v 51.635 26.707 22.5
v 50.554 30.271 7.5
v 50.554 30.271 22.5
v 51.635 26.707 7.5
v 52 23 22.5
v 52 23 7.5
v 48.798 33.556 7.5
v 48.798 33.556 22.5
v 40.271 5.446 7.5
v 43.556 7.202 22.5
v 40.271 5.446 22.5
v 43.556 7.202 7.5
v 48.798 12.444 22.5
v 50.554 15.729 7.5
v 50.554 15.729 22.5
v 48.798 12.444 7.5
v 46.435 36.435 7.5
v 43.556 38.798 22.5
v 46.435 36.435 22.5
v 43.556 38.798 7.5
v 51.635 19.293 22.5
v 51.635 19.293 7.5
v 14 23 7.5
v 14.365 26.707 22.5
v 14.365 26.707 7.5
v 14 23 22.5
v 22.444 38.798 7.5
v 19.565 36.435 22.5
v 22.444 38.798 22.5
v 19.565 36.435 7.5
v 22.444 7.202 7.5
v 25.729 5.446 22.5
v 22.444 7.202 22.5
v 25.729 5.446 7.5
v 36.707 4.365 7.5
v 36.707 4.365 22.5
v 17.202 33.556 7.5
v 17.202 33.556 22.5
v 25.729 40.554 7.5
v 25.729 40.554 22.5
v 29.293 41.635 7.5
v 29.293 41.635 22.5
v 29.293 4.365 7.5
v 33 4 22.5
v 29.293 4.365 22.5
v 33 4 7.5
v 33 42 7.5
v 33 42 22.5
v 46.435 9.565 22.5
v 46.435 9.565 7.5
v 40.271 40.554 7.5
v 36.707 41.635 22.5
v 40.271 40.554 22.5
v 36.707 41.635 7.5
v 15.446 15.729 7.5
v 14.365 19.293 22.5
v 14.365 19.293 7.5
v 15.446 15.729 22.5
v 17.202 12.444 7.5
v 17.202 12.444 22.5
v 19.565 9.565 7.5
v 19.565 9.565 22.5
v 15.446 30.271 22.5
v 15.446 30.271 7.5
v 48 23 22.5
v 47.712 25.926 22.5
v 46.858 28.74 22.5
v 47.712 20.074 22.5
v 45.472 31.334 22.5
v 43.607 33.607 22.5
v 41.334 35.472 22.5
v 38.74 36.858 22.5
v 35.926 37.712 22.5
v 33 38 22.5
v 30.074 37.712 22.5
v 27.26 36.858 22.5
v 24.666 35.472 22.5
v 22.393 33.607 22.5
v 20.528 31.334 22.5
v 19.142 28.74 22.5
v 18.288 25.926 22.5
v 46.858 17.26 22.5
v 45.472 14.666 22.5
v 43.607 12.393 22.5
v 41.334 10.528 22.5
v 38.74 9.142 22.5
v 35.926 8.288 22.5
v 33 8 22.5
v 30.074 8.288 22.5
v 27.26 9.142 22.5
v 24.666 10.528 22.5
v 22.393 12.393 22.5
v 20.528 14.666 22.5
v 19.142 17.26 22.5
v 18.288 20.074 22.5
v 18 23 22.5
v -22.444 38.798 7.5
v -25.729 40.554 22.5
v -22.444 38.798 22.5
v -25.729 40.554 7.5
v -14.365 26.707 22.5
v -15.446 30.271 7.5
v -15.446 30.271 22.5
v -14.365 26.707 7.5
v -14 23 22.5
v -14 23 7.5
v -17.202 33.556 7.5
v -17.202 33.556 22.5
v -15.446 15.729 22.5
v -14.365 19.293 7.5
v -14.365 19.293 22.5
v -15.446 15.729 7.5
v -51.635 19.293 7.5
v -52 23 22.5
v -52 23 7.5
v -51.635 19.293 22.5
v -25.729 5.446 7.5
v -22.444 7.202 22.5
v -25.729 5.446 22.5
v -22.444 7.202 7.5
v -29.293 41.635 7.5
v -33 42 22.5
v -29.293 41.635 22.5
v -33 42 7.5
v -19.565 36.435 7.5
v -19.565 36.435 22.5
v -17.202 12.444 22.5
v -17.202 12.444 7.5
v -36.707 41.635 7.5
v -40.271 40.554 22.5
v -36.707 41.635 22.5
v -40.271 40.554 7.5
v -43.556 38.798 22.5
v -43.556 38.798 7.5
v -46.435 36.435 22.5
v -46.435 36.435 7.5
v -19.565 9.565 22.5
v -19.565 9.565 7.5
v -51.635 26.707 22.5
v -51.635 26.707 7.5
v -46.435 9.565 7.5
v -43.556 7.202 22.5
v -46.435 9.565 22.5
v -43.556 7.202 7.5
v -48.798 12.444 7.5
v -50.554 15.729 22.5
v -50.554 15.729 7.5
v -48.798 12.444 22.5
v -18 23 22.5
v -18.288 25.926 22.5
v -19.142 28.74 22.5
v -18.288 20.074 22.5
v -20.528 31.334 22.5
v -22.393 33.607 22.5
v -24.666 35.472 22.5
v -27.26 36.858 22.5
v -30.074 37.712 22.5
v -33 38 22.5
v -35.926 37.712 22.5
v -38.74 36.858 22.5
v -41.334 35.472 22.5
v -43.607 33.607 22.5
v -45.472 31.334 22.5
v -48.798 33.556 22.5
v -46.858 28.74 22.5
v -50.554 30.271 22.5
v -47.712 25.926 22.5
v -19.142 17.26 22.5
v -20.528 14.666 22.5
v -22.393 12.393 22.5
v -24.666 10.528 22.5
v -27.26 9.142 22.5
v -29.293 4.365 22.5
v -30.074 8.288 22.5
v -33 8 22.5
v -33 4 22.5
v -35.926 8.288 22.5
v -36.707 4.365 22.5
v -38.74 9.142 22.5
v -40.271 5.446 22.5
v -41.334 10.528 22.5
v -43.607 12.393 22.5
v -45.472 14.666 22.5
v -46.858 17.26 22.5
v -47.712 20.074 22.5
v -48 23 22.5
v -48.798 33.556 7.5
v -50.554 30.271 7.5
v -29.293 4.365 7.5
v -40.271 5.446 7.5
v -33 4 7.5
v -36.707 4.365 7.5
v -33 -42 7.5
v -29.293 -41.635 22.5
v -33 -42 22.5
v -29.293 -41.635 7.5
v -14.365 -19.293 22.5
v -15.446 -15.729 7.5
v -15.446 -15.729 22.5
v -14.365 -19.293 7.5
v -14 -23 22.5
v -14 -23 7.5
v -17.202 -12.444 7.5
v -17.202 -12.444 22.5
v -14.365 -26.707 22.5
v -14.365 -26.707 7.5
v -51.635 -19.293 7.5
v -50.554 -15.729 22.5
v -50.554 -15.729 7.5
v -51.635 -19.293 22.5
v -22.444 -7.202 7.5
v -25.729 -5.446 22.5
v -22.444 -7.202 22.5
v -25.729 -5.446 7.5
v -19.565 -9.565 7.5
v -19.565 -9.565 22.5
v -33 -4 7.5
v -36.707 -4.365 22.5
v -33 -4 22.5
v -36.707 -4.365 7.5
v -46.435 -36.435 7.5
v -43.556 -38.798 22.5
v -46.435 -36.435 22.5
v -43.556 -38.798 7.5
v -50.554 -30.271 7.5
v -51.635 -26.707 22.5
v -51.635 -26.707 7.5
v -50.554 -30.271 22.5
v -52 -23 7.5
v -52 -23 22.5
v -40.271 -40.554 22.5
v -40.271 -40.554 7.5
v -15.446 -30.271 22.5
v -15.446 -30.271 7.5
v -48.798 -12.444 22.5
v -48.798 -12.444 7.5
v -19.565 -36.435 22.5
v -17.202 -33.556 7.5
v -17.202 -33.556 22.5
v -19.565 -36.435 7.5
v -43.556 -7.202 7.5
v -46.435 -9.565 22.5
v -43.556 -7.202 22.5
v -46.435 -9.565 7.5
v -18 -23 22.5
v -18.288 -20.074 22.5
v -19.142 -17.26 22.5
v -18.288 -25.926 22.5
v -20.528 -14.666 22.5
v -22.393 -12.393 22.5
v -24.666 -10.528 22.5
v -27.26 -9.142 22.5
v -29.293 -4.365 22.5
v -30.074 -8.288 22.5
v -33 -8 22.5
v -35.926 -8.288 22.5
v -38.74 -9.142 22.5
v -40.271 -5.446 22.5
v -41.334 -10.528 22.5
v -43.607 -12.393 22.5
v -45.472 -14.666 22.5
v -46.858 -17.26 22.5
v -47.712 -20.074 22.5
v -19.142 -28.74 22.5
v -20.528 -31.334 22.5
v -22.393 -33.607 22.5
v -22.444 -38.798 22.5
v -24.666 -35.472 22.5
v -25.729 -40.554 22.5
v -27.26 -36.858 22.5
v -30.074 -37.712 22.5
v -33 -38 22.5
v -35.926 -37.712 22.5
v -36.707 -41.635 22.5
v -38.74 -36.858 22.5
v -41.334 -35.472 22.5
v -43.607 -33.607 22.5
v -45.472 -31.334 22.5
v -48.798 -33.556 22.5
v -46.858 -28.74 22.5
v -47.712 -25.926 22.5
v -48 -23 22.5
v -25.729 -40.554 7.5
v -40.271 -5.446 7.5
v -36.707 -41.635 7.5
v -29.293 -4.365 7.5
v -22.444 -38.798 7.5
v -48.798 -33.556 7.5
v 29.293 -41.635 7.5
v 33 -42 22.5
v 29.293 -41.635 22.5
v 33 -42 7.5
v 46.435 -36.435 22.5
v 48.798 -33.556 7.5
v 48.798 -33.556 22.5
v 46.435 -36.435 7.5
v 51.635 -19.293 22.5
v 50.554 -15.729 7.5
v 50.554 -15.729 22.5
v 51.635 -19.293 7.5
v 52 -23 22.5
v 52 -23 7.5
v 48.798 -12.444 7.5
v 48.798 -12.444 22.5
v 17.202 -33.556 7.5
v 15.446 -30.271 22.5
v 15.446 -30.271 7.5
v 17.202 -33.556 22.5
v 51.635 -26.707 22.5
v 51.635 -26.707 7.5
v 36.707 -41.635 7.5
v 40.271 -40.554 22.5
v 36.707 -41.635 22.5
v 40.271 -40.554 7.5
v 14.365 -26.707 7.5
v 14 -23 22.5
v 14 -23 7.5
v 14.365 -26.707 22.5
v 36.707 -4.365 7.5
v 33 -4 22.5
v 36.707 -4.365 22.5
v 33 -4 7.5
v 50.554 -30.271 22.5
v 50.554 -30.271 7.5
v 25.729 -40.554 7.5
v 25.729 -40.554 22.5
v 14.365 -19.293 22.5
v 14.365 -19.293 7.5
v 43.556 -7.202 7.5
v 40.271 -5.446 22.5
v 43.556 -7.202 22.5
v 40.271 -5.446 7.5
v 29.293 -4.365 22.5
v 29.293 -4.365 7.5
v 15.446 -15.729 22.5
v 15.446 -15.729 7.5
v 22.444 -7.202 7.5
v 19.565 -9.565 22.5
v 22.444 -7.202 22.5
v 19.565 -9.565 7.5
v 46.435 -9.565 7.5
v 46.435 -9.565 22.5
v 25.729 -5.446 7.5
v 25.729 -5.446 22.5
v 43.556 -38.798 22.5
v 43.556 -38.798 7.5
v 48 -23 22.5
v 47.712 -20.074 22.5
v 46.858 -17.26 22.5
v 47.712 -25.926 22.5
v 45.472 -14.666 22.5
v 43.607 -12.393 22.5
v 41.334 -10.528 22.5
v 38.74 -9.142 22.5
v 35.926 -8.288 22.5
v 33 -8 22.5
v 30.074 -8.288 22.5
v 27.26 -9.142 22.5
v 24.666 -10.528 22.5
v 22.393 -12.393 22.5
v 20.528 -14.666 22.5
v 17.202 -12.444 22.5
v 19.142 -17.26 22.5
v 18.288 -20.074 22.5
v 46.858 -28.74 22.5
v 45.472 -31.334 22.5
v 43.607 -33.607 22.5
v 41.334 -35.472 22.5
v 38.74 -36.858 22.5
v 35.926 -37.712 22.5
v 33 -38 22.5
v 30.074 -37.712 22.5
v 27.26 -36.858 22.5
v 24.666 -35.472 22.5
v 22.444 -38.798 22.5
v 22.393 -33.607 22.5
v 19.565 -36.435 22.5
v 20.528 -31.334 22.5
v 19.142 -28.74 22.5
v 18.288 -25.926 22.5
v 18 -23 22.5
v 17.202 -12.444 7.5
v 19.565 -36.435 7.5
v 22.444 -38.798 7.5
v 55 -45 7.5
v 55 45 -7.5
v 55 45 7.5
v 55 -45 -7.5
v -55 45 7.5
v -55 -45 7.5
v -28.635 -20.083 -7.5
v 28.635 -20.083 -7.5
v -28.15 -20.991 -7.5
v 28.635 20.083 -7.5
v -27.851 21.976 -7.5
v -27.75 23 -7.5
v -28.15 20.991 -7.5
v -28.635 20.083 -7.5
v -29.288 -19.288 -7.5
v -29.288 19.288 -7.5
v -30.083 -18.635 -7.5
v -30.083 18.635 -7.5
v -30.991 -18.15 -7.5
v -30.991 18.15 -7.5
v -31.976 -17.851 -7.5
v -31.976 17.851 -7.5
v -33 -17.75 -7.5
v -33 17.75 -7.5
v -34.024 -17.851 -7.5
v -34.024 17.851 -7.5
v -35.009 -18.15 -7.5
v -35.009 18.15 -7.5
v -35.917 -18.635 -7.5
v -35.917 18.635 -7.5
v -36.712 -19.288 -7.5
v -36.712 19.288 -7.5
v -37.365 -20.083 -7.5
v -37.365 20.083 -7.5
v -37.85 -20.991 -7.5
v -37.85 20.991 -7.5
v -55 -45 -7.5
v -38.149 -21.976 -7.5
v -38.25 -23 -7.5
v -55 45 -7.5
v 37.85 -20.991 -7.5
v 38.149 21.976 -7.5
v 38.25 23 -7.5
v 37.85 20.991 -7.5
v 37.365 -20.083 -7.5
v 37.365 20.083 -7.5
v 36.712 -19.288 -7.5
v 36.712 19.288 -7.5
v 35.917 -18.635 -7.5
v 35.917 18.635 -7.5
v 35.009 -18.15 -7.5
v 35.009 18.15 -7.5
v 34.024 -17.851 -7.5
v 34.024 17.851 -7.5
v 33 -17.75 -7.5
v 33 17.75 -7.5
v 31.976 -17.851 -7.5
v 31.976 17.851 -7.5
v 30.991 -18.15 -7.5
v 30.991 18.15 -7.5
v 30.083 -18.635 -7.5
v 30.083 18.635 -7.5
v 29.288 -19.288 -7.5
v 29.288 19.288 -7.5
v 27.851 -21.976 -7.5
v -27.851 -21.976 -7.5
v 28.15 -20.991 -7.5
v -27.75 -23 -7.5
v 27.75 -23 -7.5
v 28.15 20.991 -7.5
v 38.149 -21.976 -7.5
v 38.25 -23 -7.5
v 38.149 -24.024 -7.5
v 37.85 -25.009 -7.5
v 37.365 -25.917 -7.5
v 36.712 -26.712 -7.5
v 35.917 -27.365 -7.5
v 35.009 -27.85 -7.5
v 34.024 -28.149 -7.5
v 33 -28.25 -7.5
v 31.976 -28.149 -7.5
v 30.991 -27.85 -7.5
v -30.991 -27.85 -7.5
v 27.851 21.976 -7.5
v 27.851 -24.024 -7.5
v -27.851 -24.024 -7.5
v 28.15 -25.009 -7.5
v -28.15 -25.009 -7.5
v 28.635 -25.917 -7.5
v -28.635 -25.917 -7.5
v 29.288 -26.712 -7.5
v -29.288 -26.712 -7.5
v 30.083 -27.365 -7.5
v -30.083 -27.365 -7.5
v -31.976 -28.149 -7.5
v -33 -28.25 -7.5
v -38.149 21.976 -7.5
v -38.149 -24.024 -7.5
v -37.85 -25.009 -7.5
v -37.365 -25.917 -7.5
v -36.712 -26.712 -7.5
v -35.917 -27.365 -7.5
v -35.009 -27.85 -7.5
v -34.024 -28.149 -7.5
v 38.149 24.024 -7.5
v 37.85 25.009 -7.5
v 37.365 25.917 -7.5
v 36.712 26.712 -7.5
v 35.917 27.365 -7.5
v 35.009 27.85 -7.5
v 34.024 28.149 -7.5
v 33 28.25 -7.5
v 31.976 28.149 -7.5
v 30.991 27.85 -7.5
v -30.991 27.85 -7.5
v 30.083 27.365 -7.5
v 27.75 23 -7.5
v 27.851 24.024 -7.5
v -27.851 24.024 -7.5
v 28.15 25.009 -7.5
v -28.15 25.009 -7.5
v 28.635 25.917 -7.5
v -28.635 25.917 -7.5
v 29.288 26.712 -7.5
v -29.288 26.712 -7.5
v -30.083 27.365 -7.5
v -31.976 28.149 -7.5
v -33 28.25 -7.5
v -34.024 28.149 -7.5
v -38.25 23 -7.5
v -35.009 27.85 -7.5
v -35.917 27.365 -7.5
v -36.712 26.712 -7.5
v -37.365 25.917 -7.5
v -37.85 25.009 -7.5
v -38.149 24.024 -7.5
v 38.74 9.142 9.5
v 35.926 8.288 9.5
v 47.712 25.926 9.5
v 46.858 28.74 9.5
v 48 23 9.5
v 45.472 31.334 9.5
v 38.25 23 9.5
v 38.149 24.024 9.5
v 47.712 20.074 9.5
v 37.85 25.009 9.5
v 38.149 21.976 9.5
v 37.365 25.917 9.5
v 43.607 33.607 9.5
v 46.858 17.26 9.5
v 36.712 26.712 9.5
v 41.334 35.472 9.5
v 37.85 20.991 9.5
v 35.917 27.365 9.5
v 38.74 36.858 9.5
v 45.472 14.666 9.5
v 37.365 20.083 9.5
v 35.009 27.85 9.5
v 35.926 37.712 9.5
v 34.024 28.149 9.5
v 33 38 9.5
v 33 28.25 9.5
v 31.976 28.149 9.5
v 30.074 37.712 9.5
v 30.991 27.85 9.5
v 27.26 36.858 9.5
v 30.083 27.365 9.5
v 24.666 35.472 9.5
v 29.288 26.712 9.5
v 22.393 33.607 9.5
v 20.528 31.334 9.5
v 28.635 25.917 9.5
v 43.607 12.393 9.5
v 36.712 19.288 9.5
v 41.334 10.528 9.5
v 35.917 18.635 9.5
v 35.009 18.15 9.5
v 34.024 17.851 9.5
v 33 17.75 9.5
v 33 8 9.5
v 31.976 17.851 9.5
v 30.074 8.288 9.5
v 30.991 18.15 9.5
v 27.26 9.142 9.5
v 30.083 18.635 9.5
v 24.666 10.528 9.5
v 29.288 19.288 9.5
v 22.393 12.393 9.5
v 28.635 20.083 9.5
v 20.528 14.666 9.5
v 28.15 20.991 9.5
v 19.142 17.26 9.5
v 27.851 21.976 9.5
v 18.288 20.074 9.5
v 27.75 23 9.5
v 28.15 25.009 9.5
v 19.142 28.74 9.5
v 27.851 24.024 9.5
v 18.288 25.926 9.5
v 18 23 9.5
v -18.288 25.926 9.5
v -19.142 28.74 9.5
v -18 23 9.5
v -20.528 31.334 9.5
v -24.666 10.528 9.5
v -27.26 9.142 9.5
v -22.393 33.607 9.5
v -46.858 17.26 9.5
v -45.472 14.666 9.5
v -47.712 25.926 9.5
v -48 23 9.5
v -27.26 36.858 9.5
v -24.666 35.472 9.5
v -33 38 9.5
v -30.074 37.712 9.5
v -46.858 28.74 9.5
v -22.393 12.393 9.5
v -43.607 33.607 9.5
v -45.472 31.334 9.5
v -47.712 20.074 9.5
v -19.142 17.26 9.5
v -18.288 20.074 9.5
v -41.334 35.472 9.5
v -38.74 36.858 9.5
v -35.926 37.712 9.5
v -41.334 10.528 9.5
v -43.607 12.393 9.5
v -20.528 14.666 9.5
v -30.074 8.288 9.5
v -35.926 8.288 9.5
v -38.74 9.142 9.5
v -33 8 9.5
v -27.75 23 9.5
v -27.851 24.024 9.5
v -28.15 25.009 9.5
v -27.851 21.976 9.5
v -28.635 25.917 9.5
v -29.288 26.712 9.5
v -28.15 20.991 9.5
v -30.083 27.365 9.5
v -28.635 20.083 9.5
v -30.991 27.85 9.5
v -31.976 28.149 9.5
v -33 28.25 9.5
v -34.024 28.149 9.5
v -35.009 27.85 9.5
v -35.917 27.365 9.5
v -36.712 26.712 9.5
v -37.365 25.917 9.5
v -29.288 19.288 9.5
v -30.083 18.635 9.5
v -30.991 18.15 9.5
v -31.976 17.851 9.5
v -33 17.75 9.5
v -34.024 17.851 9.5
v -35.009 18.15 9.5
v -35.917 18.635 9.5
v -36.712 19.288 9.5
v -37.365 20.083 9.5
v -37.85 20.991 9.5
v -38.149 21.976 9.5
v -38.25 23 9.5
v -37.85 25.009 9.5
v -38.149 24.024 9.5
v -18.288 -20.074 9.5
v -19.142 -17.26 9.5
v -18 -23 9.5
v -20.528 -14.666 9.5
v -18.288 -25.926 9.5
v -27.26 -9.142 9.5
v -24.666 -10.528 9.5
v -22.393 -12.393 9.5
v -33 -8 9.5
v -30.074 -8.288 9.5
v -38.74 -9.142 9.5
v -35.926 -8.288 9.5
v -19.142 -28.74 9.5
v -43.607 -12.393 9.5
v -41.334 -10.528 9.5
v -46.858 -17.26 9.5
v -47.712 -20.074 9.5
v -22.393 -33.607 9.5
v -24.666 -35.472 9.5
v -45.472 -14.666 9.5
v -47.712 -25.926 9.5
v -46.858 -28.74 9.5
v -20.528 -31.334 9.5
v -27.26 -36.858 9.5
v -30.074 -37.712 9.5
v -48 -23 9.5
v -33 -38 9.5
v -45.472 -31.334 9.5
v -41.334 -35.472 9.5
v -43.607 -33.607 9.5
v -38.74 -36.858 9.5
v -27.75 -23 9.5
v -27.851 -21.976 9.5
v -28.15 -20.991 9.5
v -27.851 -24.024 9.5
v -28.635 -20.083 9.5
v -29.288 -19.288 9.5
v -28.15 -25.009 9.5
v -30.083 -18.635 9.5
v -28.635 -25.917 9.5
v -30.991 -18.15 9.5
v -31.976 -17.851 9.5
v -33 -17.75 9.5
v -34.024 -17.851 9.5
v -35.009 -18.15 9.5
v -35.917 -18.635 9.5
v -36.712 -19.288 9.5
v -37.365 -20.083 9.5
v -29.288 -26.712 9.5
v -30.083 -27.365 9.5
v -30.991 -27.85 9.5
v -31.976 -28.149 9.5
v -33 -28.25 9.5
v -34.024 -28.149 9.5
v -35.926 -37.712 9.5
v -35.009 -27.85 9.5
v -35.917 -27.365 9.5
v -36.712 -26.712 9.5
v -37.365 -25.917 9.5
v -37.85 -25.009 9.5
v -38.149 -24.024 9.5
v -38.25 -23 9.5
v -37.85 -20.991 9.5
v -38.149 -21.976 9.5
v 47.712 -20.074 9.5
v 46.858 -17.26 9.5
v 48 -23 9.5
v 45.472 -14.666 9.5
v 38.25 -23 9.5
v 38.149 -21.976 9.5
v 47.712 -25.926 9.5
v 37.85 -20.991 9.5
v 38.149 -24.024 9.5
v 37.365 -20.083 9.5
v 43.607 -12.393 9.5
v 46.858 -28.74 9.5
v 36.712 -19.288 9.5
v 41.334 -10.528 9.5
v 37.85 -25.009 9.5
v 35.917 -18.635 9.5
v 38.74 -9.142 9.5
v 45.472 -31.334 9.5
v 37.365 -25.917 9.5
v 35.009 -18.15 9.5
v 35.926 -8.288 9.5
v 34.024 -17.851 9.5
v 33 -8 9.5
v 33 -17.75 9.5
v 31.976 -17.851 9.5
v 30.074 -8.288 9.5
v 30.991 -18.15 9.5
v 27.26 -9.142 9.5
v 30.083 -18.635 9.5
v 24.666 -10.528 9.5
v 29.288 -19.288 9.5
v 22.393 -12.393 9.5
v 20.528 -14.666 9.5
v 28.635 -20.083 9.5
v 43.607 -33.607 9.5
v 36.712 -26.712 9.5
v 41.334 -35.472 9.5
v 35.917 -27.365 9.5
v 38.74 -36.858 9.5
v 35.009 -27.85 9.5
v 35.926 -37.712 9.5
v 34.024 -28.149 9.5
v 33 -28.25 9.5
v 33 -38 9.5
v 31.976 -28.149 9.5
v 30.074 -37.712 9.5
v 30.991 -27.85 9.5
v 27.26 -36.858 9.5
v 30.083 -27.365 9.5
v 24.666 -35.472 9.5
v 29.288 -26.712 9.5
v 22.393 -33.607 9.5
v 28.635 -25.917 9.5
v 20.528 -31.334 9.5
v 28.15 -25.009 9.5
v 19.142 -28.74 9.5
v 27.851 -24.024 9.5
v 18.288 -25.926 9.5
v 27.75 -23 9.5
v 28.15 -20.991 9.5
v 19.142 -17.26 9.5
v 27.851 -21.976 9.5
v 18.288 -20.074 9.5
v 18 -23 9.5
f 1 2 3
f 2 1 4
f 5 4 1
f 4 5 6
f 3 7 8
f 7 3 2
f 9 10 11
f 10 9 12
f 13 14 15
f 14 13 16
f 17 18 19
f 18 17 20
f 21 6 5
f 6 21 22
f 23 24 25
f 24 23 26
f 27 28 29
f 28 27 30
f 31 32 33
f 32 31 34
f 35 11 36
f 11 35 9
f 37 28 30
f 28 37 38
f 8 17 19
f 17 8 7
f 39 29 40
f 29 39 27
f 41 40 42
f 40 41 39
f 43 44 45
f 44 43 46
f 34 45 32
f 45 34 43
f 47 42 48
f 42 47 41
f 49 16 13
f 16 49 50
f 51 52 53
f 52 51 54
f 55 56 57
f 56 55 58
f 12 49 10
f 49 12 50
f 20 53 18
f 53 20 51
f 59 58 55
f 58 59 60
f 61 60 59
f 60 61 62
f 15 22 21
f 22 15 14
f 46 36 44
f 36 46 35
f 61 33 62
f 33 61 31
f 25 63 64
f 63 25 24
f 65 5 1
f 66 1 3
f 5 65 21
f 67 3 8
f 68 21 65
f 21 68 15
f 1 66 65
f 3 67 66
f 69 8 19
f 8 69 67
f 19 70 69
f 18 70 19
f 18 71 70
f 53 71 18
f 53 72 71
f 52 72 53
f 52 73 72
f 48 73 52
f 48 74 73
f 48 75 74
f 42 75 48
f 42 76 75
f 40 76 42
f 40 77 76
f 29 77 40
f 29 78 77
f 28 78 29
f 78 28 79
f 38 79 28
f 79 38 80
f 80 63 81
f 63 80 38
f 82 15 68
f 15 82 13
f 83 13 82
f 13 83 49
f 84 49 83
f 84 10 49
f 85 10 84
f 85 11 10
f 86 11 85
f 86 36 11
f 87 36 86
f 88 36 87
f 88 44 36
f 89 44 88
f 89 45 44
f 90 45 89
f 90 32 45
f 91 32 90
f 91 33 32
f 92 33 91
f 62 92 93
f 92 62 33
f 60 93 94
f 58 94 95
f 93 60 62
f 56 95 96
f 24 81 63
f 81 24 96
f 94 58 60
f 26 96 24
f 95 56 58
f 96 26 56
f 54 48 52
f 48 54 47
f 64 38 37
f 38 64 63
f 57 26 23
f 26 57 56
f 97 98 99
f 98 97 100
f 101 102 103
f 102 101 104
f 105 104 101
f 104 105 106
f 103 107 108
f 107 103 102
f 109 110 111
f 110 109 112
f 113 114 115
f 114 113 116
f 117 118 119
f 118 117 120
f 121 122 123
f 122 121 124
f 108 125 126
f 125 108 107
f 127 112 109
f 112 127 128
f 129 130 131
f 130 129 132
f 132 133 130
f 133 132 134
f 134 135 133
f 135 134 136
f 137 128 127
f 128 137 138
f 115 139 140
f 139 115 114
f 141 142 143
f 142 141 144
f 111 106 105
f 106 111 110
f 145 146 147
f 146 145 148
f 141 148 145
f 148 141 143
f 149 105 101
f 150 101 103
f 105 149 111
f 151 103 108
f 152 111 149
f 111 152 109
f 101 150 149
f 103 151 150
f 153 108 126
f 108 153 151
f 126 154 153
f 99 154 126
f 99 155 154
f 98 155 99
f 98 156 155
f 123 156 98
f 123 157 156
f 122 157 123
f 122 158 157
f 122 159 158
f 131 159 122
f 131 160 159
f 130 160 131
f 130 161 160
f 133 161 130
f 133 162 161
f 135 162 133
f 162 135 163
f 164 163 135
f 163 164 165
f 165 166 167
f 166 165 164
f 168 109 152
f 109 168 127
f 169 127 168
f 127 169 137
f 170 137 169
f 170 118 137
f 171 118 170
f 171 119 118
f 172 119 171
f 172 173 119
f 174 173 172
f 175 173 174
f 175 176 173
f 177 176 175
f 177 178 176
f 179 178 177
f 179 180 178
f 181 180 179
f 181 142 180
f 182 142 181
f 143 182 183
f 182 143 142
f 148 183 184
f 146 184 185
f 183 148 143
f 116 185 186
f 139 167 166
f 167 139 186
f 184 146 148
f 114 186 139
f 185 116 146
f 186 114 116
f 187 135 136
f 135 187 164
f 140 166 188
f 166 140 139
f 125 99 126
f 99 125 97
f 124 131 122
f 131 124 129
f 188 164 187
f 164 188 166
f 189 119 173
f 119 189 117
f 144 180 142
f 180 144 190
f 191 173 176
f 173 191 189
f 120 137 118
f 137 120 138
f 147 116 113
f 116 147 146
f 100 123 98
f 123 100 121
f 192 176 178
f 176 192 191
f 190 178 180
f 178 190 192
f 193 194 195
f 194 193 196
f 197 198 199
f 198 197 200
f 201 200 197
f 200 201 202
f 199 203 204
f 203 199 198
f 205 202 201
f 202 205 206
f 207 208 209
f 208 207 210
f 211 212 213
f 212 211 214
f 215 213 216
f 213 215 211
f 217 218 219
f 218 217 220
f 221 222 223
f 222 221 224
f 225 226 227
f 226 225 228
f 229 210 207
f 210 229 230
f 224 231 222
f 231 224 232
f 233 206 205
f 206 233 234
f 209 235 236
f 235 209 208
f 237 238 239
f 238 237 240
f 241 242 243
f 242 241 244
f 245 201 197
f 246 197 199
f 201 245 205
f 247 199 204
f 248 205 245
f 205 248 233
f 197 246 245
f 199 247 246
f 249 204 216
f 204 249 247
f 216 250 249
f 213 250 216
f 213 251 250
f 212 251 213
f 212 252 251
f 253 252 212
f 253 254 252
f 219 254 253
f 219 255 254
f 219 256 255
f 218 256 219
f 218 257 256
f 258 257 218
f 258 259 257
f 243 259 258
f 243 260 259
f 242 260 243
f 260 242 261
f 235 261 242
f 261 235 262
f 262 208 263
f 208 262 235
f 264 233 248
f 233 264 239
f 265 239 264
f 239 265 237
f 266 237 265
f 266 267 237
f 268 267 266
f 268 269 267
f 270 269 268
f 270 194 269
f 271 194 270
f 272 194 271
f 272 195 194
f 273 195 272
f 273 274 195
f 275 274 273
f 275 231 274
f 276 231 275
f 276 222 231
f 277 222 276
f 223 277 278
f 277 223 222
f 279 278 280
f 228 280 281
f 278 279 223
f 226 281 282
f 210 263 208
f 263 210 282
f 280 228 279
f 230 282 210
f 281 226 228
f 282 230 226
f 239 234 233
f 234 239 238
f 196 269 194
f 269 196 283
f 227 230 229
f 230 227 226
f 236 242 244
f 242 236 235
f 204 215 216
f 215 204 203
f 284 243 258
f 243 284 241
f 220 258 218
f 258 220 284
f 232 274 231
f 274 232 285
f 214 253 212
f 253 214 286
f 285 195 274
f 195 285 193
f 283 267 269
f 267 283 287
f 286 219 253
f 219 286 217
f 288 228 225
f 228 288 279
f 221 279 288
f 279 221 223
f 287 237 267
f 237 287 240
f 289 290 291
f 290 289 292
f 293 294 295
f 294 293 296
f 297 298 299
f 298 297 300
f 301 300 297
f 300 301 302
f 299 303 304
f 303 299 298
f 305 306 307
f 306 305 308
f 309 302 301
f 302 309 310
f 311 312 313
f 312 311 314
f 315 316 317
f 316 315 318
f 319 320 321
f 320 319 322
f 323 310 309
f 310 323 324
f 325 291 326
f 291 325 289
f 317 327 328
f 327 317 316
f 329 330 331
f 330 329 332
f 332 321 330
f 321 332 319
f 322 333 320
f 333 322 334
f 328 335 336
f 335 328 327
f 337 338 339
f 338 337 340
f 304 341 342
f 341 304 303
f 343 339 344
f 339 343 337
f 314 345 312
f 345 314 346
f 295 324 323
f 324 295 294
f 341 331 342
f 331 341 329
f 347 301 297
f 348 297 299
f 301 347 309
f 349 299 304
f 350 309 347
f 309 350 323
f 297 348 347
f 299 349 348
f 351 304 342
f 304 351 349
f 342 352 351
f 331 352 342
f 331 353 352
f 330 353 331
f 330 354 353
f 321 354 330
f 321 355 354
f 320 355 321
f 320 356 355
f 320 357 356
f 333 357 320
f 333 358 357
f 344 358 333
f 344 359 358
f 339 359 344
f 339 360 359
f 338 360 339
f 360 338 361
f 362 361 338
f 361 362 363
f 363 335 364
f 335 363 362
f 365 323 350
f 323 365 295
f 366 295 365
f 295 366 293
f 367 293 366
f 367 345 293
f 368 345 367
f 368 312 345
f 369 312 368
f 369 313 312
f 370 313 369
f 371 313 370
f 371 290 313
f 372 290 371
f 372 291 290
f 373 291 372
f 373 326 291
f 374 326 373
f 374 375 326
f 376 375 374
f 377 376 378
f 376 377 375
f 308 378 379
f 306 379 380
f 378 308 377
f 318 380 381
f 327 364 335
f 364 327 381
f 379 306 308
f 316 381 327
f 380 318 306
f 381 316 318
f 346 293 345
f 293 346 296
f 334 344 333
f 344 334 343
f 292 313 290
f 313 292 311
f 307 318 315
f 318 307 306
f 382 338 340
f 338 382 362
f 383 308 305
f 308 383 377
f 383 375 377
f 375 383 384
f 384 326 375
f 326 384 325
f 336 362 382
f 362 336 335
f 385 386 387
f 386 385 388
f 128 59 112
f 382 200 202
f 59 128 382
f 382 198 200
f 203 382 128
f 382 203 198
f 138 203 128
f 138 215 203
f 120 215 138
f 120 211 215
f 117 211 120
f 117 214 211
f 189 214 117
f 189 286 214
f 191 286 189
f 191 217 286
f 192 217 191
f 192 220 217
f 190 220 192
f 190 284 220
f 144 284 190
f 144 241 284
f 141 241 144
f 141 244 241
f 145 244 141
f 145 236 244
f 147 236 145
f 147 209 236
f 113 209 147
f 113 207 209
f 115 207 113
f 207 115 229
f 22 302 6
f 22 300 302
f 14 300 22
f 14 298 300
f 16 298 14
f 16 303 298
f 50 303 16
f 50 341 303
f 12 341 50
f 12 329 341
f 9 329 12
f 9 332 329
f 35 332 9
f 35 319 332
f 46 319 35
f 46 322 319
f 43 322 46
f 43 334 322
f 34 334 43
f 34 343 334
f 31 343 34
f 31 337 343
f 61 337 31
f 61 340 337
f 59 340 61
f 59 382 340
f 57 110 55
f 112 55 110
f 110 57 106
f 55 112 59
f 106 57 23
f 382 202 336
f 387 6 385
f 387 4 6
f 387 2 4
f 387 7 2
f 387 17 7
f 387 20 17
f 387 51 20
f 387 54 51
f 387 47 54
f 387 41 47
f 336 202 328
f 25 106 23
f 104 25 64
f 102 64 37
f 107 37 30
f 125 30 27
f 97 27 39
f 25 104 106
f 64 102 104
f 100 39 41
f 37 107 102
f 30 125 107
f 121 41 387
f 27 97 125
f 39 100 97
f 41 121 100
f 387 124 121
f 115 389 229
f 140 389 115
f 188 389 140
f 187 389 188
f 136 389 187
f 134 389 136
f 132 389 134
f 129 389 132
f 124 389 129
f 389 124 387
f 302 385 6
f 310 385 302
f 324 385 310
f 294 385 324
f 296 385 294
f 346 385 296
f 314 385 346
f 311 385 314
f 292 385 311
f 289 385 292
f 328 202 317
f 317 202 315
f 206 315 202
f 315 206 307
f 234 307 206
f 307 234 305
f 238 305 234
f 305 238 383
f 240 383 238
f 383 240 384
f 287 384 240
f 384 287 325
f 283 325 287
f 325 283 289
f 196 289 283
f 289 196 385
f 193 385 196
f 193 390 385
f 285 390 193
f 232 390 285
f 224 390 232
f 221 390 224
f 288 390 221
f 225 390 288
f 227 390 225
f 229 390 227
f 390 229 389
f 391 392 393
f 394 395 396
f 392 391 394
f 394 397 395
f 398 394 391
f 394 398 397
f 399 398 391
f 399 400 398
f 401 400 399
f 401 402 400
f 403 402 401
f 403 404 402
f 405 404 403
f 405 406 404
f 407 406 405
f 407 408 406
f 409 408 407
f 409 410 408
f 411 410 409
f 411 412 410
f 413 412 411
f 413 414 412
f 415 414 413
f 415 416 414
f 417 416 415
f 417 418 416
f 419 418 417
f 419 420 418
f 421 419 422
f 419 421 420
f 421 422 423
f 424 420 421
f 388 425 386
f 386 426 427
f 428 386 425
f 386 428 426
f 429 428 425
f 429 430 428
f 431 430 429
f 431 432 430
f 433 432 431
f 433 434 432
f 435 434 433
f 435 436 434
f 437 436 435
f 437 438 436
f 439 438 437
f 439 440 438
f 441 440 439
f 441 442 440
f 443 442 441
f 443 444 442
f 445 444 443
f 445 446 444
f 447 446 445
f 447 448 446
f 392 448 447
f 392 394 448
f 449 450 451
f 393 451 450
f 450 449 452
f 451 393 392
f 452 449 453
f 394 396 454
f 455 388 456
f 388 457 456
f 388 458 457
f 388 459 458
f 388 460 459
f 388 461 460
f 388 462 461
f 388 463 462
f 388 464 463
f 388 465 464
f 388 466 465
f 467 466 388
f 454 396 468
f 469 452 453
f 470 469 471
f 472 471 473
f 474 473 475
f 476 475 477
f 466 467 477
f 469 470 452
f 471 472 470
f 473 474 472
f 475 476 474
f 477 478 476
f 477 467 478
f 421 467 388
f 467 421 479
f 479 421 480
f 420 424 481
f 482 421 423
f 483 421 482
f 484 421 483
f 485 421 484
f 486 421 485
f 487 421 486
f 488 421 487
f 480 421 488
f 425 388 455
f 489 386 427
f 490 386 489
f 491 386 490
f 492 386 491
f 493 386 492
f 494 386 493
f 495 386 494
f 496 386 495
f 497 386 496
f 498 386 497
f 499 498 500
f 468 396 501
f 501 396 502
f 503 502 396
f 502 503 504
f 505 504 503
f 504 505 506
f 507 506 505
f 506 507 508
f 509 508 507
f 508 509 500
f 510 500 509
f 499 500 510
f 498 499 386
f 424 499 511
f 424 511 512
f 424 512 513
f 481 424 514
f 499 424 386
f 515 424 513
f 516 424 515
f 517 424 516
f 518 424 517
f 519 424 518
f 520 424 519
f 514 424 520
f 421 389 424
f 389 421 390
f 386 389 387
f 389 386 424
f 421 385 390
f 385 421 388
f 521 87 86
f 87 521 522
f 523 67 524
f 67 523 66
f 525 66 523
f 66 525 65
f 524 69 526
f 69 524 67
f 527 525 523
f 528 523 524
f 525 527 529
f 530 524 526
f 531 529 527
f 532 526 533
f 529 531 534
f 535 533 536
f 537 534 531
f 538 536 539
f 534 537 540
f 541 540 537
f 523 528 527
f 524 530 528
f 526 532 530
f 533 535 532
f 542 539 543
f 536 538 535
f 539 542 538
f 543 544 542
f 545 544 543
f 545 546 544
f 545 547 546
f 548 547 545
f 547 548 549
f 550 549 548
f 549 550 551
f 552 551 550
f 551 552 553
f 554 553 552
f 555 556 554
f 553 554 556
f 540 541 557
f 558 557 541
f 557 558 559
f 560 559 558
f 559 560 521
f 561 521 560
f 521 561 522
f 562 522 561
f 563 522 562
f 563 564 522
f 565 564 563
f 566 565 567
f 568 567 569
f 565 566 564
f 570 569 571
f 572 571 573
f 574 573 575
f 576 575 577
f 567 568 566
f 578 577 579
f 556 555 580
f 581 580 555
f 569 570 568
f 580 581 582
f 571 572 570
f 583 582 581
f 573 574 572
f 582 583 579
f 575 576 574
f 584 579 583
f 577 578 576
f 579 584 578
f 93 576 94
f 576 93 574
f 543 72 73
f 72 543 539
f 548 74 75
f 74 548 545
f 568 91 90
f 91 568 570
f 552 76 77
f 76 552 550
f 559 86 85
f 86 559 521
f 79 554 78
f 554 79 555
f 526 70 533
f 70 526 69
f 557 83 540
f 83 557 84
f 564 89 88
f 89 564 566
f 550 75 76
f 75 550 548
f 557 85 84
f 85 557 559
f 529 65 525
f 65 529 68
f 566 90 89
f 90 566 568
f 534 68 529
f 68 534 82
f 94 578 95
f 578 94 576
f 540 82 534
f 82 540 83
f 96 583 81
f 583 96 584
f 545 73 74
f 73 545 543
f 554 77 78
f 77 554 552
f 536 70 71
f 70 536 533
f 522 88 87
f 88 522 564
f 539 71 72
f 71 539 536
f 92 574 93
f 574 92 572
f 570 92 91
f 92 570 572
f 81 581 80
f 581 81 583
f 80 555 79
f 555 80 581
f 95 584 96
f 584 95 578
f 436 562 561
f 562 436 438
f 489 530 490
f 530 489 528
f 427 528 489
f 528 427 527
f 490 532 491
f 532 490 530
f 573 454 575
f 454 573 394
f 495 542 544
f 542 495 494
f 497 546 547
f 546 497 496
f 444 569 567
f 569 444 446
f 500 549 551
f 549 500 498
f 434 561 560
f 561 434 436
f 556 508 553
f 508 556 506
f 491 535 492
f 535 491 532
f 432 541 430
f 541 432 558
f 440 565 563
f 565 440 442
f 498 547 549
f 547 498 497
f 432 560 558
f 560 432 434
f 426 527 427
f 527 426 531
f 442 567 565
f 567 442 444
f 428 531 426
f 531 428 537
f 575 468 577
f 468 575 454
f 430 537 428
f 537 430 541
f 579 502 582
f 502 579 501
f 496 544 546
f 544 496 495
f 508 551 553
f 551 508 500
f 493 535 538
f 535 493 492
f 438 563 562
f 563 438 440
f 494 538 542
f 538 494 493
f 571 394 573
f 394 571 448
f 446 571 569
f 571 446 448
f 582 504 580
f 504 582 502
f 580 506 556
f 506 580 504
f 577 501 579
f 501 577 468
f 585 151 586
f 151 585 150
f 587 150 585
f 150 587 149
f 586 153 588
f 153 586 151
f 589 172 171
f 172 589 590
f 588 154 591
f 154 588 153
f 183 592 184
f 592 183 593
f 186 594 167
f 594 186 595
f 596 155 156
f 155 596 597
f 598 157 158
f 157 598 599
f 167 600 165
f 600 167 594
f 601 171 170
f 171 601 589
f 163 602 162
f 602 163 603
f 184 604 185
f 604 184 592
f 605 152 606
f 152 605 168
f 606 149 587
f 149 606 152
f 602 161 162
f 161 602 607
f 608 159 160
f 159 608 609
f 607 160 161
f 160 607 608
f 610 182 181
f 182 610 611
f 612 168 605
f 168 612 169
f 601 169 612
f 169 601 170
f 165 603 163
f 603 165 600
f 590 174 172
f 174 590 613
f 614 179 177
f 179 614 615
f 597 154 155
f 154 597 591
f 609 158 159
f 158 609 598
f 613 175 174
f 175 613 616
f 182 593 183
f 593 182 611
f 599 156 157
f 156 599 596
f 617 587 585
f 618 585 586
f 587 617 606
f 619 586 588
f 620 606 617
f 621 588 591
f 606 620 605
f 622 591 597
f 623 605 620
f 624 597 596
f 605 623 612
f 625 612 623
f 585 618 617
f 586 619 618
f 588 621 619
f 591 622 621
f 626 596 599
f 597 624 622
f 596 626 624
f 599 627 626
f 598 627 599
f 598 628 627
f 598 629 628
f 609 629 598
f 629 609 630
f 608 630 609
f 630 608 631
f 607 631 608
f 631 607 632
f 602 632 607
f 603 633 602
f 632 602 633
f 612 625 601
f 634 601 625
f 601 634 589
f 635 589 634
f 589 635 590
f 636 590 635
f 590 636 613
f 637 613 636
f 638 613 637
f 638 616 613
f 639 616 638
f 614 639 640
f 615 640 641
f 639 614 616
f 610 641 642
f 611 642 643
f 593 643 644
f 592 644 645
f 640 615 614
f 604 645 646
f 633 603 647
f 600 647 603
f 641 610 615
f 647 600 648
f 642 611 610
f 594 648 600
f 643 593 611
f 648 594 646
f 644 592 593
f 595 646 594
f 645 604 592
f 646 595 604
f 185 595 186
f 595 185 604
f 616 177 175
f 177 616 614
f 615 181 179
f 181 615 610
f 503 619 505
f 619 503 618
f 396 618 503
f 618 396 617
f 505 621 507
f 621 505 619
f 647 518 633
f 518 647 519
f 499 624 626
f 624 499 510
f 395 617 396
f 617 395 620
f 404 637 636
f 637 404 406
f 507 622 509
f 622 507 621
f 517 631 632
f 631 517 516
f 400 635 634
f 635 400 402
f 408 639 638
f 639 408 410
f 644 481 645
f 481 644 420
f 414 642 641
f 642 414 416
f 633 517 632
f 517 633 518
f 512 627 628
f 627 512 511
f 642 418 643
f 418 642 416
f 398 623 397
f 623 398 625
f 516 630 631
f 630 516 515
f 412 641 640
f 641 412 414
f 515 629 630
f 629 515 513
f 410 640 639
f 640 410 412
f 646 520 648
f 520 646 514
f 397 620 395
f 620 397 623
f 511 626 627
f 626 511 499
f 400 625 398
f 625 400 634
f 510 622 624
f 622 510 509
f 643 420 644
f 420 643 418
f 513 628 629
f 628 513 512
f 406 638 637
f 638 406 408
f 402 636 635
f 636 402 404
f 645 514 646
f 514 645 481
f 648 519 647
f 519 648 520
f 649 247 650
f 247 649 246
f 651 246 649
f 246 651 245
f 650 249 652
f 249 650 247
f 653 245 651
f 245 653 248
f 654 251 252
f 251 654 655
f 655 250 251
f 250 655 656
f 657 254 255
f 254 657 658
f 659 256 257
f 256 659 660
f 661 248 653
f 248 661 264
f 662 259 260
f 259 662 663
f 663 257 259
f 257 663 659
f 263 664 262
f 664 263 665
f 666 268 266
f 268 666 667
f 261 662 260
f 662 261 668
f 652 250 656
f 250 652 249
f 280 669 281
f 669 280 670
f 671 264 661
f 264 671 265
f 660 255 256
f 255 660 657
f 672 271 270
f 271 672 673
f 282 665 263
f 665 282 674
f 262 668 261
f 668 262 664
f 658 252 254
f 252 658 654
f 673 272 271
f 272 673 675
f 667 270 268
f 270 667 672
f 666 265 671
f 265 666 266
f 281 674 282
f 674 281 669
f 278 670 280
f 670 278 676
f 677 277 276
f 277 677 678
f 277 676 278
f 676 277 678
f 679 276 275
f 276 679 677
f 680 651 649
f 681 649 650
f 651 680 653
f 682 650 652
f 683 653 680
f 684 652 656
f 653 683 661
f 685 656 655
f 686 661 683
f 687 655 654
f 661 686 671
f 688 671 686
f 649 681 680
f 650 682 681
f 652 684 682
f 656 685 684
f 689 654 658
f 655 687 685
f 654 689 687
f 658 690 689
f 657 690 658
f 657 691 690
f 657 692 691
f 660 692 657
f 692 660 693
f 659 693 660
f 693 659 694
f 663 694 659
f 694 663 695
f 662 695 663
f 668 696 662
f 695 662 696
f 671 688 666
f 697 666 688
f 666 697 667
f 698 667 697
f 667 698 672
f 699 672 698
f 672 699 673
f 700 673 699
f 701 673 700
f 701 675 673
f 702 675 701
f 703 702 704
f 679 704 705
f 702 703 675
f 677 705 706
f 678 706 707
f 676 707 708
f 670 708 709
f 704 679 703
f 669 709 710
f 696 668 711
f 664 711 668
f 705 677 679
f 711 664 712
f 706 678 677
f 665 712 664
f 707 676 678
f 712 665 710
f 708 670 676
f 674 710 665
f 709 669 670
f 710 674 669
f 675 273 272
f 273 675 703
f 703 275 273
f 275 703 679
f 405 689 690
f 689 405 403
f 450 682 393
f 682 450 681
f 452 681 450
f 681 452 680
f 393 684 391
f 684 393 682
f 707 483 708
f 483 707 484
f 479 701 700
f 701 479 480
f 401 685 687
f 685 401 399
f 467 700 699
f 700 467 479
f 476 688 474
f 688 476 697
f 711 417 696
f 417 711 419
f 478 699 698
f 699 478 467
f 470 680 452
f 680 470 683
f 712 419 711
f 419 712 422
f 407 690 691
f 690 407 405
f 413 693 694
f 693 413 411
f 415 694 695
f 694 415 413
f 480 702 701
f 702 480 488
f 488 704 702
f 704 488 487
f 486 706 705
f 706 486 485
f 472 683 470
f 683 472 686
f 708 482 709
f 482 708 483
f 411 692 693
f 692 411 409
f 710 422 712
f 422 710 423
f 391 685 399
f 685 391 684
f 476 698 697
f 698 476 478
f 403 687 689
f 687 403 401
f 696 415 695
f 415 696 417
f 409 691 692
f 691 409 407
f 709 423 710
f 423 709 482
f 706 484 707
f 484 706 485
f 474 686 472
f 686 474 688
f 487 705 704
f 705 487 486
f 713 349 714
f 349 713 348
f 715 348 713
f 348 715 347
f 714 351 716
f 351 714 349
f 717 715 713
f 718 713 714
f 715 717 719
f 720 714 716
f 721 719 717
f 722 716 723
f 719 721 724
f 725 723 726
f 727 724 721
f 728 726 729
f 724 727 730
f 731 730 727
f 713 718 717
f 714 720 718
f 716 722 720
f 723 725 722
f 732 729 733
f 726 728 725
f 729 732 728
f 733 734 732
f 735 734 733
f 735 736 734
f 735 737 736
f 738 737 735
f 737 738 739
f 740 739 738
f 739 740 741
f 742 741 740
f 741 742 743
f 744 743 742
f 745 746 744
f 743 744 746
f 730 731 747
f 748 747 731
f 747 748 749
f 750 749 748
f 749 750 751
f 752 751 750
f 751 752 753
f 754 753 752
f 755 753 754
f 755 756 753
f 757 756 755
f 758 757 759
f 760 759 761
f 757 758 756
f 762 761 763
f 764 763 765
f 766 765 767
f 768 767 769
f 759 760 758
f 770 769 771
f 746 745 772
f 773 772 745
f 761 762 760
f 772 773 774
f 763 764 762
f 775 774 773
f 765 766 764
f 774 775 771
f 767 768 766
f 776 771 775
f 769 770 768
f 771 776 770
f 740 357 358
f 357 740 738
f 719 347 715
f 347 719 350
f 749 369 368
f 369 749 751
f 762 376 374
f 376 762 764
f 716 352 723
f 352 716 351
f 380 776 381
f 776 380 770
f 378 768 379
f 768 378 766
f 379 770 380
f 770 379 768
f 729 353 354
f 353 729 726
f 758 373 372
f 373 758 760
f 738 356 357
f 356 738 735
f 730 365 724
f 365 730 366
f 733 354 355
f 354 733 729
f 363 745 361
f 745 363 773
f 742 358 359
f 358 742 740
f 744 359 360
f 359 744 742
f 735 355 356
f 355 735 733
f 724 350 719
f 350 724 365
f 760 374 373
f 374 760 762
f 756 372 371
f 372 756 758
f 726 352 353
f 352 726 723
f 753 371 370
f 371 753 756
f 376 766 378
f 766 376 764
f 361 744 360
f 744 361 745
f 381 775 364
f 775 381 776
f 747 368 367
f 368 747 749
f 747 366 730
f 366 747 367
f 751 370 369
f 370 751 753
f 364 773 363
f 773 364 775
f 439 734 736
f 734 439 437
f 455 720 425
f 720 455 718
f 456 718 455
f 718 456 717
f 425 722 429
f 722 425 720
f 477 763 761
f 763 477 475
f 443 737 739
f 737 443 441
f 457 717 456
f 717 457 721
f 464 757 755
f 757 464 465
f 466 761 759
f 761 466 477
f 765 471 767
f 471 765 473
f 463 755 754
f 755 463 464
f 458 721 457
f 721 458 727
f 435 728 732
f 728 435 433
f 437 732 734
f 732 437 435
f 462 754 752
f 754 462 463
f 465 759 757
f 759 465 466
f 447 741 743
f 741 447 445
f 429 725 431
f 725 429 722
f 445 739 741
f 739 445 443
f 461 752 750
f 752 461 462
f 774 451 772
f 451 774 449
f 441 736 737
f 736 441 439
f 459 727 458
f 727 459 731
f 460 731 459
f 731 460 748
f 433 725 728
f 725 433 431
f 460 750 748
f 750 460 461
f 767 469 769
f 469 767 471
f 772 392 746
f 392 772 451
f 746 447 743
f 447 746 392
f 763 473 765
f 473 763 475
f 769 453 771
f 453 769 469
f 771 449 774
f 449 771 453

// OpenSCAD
$fn = 32;

// ----------------------------------------------------------------------
// Socket pad plate
// bosses with counterbored sockets for the screws
// ----------------------------------------------------------------------

// --- parameters (mm) ---
base_t = 15;            // base plate thickness
boss_h = 15;            // boss height above the base plate
boss_d = 38;            // boss diameter
socket_d = 30;          // socket diameter
socket_depth = 13;      // socket depth from the boss face
bolt_d = 10.5;          // screw clearance hole through the socket floor
plate = [110, 90, 15];  // overall size (x, y, z)
edge = 22;              // boss centre offset from the plate edge
pads = 4;               // boss count, one per corner

// --- derived feature positions (mm) ---
height = base_t + boss_h;        // = 30   overall height of the part
corner_x = plate[0] / 2 - edge;  // = 33   boss centre X
corner_y = plate[1] / 2 - edge;  // = 23   boss centre Y
feature_centers = [
  [corner_x, corner_y],
  [-corner_x, corner_y],
  [-corner_x, -corner_y],
  [corner_x, -corner_y]
];   // boss centres: sockets, holes and the pads themselves are placed from here

// base plate, bosses on feature_centers, socket + through hole in each
difference() {
  union() {
    cube(plate, center = true);
    for (centre = feature_centers)
      translate([centre[0], centre[1], plate[2] / 2 - 1])
        cylinder(d = boss_d, h = boss_h + 1);
  }
  for (centre = feature_centers) {
    translate([centre[0], centre[1], plate[2] / 2 + boss_h - socket_depth])
      cylinder(d = socket_d, h = socket_depth + 1);
    translate([centre[0], centre[1], -height])
      cylinder(d = bolt_d, h = 2 * height + 2);  // through the socket floor
  }
}
